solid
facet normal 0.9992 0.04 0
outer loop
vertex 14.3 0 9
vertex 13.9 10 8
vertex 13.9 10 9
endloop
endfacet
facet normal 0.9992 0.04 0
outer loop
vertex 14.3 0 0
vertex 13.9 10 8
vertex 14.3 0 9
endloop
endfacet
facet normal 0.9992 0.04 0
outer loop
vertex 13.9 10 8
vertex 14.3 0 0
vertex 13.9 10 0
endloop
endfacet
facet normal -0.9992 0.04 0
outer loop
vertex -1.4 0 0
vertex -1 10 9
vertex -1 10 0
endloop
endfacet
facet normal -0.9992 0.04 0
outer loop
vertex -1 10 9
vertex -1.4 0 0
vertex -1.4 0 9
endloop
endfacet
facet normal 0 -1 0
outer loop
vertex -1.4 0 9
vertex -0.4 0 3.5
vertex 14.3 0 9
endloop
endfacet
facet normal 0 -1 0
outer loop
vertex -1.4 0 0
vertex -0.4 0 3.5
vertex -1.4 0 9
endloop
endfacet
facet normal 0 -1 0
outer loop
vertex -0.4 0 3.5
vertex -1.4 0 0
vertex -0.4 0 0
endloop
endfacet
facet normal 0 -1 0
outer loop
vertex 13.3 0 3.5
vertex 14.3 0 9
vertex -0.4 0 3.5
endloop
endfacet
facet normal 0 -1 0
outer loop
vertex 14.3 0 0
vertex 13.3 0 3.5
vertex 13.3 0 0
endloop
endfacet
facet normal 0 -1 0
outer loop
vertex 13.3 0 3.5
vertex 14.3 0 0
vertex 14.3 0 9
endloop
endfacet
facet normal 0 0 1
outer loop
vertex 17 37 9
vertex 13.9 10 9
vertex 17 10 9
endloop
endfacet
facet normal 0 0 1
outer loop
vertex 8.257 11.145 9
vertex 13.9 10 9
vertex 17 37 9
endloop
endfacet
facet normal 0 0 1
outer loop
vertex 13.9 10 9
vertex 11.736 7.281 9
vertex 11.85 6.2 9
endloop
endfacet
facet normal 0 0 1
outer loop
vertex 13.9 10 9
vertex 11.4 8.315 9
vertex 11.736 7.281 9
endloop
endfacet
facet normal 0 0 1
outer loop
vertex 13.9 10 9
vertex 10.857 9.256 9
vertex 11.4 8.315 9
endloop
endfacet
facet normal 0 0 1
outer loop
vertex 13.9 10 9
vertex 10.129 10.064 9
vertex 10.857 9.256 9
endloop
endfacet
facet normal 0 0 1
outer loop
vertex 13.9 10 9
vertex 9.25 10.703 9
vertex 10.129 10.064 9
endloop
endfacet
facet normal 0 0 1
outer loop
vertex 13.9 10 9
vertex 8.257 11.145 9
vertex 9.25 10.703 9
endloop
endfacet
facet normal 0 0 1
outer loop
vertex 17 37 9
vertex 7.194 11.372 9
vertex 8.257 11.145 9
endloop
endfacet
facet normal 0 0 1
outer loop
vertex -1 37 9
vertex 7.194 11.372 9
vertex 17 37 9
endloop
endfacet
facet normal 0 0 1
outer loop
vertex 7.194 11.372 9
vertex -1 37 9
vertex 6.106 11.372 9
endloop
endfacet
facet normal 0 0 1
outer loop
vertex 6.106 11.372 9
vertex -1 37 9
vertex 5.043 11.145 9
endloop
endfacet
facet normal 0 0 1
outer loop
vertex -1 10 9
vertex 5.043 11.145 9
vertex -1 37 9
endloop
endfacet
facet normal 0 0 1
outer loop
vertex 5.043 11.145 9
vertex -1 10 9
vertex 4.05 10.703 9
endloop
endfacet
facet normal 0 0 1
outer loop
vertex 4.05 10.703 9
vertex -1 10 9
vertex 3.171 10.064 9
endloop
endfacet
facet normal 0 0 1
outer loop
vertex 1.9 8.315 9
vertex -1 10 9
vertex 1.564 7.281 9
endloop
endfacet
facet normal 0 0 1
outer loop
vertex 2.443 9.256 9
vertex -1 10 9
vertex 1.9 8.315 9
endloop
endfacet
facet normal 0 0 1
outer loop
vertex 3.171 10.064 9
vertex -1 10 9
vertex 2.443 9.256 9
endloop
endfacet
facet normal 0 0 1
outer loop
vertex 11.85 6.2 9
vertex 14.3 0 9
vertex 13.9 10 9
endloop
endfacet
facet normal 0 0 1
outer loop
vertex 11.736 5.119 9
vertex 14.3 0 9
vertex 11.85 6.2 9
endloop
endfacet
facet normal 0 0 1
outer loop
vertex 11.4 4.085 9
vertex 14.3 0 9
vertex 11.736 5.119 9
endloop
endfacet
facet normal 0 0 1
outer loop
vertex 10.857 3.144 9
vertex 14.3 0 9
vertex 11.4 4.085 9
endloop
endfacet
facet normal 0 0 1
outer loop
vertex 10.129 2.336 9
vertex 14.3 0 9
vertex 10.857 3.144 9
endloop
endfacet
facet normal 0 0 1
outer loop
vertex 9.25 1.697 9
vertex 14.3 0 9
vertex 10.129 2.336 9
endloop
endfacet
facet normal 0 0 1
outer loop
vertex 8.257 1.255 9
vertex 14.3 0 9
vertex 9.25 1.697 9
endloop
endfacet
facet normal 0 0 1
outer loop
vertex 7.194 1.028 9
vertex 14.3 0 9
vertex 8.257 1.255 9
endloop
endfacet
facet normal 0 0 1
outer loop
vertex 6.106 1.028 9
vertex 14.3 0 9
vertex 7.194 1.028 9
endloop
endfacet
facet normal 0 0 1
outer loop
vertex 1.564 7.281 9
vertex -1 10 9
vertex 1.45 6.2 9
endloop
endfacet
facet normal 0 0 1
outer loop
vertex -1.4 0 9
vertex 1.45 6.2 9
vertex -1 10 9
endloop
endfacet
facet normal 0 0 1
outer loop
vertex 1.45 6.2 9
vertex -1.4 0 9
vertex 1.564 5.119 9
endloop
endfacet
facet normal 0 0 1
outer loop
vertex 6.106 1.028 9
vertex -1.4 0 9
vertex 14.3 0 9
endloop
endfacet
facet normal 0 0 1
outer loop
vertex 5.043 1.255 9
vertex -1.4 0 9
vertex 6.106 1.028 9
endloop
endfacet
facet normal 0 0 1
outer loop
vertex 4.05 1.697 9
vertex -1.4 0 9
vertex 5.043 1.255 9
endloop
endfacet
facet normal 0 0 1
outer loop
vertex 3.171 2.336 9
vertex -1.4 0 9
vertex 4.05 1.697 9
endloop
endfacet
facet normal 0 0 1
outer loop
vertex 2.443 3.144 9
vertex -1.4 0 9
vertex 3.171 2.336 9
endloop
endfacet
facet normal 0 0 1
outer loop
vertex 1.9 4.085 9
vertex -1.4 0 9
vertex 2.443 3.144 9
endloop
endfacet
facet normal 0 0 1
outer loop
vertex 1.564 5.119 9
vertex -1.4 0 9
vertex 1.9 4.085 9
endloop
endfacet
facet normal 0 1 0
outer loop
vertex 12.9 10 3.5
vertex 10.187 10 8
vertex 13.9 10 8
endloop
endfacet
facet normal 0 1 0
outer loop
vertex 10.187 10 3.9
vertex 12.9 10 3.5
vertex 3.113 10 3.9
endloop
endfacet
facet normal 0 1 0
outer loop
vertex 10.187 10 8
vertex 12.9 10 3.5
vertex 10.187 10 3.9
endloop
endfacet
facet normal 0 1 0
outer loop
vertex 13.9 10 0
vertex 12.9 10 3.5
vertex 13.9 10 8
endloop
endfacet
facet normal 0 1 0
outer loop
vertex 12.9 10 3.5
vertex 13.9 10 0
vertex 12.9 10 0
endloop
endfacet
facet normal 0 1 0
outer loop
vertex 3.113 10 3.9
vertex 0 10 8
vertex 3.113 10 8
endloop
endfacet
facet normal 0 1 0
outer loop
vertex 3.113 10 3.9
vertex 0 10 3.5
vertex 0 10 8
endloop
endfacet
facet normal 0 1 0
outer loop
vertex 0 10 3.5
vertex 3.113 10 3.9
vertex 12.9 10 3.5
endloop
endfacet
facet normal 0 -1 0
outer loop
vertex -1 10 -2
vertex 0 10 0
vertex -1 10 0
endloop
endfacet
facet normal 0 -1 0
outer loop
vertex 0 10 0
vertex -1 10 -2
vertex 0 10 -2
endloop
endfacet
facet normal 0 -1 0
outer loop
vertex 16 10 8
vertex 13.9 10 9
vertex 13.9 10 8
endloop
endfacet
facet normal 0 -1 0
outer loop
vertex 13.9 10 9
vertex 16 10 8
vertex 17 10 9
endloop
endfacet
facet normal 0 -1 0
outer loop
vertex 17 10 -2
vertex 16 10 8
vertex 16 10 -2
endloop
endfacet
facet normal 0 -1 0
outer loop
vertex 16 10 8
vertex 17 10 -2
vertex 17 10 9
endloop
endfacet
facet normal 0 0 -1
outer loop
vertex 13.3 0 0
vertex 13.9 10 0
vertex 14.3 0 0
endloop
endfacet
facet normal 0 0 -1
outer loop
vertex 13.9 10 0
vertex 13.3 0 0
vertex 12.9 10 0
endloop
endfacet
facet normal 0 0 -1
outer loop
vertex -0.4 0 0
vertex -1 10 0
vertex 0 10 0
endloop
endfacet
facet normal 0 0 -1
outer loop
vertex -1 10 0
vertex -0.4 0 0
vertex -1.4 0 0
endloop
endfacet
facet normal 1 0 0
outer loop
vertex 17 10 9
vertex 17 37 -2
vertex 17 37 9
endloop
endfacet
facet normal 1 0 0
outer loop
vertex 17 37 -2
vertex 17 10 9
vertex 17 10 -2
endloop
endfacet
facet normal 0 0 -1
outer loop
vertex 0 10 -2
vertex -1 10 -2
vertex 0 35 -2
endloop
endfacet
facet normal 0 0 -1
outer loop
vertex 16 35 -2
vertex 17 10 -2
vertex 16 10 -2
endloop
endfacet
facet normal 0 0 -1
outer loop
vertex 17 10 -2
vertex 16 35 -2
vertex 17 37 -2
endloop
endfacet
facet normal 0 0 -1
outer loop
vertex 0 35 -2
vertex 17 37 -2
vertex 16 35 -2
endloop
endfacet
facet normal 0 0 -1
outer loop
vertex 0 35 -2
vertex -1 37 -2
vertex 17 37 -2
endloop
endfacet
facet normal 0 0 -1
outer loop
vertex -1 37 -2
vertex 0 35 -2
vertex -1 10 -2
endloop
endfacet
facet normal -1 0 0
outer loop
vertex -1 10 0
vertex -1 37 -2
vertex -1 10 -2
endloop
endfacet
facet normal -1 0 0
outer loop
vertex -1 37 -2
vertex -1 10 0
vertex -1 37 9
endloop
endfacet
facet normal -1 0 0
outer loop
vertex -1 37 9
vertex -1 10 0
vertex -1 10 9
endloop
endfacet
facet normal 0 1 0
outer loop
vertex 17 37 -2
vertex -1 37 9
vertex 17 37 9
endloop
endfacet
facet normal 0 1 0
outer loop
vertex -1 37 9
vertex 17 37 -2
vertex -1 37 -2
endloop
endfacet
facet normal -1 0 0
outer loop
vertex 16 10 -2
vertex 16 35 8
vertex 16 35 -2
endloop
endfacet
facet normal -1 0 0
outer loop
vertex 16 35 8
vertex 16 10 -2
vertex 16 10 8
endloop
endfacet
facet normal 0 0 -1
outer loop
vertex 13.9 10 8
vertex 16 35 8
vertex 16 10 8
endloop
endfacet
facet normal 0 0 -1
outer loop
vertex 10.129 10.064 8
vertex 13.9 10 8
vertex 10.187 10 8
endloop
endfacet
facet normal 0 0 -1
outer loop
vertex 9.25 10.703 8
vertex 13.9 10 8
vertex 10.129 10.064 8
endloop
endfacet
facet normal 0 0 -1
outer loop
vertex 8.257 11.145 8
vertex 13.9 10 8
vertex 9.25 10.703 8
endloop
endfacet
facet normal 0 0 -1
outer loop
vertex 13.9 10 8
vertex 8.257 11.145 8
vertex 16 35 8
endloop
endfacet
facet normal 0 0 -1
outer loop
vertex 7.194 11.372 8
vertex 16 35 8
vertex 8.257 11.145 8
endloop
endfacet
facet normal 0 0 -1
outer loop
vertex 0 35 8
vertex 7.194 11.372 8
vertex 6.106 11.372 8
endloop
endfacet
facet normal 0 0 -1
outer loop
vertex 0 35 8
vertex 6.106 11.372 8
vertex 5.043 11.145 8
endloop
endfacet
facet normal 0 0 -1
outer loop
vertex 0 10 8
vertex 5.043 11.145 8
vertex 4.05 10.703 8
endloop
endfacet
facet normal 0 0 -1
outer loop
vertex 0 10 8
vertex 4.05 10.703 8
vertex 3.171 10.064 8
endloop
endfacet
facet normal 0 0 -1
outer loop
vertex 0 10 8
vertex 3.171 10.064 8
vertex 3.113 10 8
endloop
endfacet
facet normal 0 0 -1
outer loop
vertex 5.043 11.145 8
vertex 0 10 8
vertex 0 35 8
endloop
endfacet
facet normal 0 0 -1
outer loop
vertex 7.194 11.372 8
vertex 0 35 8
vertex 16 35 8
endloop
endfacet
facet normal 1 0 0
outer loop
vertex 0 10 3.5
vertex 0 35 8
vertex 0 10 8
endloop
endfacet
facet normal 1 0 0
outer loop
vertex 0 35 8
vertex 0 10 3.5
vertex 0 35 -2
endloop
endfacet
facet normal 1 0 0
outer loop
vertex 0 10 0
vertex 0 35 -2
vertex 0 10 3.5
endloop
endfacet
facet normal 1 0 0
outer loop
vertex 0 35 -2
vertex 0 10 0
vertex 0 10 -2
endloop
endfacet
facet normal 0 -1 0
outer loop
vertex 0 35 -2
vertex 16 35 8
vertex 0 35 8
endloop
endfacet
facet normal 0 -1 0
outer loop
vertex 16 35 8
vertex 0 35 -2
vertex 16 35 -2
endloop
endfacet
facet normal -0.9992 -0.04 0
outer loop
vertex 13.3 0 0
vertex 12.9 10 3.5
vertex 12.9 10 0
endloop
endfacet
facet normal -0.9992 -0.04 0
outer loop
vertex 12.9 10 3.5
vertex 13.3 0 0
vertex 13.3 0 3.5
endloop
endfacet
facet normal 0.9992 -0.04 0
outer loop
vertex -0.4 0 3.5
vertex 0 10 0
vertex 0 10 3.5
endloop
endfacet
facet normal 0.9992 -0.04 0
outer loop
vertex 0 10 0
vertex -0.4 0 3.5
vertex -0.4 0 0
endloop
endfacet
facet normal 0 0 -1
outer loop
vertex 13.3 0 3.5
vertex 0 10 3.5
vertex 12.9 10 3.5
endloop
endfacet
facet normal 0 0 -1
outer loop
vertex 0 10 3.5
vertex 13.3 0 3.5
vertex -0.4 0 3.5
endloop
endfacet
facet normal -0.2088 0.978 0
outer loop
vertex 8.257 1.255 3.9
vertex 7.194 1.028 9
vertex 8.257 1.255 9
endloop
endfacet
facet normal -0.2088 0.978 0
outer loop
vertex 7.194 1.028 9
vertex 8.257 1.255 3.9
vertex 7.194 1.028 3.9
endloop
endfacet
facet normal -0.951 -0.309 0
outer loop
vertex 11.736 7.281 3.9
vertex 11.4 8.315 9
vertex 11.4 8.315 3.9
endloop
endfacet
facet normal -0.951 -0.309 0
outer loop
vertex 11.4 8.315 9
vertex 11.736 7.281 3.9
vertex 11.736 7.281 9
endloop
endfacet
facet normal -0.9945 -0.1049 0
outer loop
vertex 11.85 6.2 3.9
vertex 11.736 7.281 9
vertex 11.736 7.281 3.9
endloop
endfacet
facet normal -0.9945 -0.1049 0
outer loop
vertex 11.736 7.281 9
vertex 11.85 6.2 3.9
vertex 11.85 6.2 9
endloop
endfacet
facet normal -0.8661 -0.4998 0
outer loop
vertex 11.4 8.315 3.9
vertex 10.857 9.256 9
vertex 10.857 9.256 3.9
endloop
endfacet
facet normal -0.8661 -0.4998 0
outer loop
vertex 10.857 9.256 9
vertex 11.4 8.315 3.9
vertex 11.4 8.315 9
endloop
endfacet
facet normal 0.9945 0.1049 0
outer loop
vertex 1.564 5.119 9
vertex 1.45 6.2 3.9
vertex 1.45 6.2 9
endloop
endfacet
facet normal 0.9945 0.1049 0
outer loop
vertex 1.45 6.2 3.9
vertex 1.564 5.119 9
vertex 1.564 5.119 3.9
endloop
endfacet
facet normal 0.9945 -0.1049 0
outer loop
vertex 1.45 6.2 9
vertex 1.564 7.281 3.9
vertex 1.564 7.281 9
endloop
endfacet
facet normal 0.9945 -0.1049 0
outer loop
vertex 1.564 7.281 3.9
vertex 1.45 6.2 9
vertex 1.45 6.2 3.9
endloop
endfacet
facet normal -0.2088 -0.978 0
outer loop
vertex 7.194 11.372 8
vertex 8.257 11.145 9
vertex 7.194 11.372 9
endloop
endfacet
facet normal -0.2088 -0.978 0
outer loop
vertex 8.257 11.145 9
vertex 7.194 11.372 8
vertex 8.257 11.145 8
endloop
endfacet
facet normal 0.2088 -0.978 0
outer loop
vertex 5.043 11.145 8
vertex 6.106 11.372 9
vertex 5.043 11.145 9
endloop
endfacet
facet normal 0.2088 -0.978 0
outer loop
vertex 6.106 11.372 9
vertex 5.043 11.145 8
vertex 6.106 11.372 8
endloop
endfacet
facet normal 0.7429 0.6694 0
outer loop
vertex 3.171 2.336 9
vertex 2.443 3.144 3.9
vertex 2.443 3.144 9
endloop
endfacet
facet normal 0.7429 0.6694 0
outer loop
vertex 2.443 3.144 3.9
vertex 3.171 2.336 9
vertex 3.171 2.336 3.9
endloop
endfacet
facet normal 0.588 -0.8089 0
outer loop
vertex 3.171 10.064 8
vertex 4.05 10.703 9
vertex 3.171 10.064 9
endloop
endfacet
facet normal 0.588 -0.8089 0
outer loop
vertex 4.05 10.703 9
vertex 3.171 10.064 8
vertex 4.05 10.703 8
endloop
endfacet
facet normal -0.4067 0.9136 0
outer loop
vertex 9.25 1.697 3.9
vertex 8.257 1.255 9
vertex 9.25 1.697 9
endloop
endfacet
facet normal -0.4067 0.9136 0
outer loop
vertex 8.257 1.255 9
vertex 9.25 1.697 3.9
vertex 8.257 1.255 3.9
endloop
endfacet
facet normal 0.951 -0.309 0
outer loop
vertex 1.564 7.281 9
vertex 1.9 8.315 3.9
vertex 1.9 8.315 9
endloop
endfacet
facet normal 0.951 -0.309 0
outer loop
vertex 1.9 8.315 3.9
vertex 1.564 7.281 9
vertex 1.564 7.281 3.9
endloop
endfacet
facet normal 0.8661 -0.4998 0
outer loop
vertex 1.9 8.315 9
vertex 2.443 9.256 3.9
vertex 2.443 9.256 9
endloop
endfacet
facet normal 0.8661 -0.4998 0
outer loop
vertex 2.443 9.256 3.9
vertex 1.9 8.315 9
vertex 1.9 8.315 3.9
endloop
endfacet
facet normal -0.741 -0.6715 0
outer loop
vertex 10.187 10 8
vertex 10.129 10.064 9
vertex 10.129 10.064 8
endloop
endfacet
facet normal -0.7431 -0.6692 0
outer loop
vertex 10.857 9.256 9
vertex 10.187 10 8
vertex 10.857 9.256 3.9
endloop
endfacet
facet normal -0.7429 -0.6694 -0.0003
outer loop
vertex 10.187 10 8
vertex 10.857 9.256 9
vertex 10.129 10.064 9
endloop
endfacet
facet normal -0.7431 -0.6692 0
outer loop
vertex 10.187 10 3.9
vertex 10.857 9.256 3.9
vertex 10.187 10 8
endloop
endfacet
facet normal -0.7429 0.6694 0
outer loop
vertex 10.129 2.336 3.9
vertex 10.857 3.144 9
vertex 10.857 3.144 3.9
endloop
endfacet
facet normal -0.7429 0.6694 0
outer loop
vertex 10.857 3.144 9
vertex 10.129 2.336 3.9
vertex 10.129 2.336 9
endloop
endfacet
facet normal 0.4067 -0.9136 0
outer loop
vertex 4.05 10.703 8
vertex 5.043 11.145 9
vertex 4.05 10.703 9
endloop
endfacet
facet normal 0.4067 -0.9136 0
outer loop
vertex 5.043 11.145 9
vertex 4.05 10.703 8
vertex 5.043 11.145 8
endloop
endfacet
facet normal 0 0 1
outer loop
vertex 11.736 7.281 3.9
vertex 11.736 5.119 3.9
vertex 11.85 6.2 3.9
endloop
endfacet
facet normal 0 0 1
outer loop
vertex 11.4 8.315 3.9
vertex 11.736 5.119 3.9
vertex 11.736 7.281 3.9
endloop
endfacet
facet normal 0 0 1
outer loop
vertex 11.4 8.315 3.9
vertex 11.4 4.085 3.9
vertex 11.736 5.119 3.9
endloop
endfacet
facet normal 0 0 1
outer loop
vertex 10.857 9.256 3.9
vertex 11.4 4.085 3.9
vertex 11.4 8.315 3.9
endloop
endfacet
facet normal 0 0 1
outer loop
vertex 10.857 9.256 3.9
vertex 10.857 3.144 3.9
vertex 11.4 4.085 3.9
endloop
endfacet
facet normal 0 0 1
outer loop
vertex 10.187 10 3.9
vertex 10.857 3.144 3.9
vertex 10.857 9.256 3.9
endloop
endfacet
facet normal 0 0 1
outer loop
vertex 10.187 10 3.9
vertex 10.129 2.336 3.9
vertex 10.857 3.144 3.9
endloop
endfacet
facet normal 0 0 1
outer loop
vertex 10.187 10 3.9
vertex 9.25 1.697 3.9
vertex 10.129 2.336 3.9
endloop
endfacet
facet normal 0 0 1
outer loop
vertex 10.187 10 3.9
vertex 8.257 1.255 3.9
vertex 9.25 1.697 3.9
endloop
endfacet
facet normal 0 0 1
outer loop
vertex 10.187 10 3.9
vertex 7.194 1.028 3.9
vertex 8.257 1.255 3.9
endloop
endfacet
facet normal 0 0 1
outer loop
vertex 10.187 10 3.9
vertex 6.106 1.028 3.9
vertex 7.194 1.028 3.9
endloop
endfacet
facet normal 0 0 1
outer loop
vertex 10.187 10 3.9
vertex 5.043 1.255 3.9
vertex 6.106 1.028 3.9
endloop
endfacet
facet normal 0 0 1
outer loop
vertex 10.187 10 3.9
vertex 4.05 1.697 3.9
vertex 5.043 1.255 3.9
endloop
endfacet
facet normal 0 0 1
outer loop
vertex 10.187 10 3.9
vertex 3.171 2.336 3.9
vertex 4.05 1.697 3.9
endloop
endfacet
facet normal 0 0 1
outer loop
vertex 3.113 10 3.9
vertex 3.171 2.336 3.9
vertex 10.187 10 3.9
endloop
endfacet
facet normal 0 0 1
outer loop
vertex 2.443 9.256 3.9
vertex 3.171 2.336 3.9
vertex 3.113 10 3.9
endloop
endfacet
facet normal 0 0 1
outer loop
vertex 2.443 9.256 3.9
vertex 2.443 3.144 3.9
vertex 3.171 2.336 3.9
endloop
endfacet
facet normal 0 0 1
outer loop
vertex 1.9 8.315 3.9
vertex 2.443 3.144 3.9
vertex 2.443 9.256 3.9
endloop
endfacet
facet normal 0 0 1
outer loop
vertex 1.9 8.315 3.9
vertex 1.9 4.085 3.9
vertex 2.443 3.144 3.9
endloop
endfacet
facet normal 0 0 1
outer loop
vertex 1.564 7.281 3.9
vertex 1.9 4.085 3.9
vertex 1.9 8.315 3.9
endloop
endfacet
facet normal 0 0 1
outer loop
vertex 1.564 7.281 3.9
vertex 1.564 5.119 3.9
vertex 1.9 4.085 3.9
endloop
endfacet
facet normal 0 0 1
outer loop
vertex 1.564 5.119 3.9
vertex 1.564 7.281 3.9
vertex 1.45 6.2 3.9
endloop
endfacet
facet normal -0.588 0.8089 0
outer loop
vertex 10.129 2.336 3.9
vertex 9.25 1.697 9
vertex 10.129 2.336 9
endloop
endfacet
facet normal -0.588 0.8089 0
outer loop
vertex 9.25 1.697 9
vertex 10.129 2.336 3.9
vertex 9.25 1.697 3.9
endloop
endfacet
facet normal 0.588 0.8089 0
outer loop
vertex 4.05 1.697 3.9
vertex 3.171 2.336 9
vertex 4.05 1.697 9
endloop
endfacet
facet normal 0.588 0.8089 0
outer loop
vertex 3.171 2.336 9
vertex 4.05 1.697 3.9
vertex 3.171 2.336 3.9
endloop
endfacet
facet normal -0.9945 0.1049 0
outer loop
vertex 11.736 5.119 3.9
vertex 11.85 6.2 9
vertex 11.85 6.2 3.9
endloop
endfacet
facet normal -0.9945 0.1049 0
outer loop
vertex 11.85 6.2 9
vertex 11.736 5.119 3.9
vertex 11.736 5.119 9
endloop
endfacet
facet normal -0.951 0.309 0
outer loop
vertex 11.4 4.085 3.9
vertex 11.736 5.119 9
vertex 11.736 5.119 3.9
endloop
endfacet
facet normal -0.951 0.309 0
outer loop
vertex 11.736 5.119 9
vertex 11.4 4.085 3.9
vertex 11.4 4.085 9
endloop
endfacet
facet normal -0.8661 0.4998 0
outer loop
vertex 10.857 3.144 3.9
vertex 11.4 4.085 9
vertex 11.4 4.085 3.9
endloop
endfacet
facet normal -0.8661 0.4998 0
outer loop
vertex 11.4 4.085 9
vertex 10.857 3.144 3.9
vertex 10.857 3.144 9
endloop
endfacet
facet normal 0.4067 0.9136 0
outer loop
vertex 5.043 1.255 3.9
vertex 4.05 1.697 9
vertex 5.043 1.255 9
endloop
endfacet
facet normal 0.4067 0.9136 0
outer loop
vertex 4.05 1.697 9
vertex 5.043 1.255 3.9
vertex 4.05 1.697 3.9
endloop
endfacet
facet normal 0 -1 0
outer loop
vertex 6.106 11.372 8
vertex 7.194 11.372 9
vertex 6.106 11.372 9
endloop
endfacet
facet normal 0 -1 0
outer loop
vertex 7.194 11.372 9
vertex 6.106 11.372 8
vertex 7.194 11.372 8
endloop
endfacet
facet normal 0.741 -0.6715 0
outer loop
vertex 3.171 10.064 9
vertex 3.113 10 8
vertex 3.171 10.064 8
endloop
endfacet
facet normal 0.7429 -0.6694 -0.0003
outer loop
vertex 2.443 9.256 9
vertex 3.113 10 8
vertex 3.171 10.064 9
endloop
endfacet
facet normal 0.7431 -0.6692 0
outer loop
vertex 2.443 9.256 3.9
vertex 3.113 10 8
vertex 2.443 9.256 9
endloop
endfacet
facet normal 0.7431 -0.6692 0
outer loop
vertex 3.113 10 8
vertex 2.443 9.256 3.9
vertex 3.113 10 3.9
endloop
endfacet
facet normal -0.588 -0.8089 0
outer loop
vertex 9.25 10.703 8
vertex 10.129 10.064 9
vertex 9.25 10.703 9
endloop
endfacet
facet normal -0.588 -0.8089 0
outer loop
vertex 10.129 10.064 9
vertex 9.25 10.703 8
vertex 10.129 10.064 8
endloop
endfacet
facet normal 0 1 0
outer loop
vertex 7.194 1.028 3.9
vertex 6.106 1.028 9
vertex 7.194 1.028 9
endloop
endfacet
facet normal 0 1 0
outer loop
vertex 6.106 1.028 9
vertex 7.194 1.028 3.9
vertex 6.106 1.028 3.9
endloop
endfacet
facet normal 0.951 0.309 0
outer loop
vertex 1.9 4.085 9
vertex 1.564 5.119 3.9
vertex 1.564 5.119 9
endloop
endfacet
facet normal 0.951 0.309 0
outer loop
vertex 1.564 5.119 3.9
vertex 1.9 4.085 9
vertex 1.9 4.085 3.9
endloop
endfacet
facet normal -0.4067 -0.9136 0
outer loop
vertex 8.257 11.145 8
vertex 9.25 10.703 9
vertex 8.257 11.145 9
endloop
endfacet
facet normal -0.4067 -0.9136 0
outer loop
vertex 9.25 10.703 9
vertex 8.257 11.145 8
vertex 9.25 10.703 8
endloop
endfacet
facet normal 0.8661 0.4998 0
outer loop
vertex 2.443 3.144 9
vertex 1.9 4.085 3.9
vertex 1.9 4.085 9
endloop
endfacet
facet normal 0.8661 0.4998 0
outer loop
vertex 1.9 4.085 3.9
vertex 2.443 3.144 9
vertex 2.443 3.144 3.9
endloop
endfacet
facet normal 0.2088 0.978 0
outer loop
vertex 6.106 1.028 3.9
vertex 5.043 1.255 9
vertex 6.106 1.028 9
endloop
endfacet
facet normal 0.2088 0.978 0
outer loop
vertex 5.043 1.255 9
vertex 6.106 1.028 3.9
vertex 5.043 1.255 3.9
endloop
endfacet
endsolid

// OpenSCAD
// Use partname to control which object is being rendered:
//
// _partname_values catcher
partname = "display";

// $fa is the minimum angle for a fragment. Minimum value is 0.01.
$fa = 12;
// $fs is the minimum size of a fragment. If high, causes
// fewer-than-$fa-would-indicate surfaces. Minimum is 0.01.
$fs = 0.2;

wall_w = 1;

hold_length = 10;
hold_height = 3.5;
hold_clear_w1_w2 = [13.5+0.2,12.7+0.2];
shield_w = 16;
shield_l = 25;
shield_h = 8;
// for the business end, how much extra height?
shield_h_extension = 2;

magnet_r = 5;
magnet_clear_r = 5.2;
magnet_height_diff = 0.4;

module catcher()
{
  w1_w2_diff = hold_clear_w1_w2[0]-hold_clear_w1_w2[1];

  module hold_helper (height,extra_width)
  {
    linear_extrude(height=height)
    {
      polygon([
        [-w1_w2_diff/2-extra_width/2, 0],
        [hold_clear_w1_w2[0]-w1_w2_diff/2+extra_width/2, 0],
        [hold_clear_w1_w2[1]+extra_width/2, hold_length],
        [-extra_width/2, hold_length],
      ]);
    }
  }
  build_height = max(hold_height+wall_w,shield_h+wall_w);

  difference()
  {
    union()
    {
      hold_helper(build_height,2*wall_w);
      translate([0,hold_length,0])
        // main cage (the shield):
        translate([-wall_w,0,-shield_h_extension])
          cube([shield_w+2*wall_w,shield_l+wall_w+wall_w,shield_h+wall_w+shield_h_extension]);
    }

    union()
    {
      hold_helper(hold_height,0);
      translate([
        hold_clear_w1_w2[0]/2-w1_w2_diff/2/2,
        wall_w+magnet_clear_r,
        hold_height+magnet_height_diff
      ]) {
        cylinder(r=magnet_clear_r,h=build_height);
      }
      translate([0,hold_length,0])
      {
        // main extraction from the shield:
        translate([0,0,-shield_h_extension])
        #
          cube([shield_w,shield_l,shield_h+shield_h_extension]);
        // through from hold to shield:
        translate([0,0,0])
          cube([hold_clear_w1_w2[1],2*wall_w,hold_height]);
      }
    }
  }

}


// Conventions:
// * When an object is rendered using partname, position/rotate it according to
//   printing suggestion, here. (The module itself will be positioned/rotated
//   like it will be, in the put-together "display" situation.)
// * The special value "display" for partname is the product picture for all
//   parts put together.
if ("display" == partname)
{
  catcher();
} else if ("catcher" == partname)
{
    catcher();
}
